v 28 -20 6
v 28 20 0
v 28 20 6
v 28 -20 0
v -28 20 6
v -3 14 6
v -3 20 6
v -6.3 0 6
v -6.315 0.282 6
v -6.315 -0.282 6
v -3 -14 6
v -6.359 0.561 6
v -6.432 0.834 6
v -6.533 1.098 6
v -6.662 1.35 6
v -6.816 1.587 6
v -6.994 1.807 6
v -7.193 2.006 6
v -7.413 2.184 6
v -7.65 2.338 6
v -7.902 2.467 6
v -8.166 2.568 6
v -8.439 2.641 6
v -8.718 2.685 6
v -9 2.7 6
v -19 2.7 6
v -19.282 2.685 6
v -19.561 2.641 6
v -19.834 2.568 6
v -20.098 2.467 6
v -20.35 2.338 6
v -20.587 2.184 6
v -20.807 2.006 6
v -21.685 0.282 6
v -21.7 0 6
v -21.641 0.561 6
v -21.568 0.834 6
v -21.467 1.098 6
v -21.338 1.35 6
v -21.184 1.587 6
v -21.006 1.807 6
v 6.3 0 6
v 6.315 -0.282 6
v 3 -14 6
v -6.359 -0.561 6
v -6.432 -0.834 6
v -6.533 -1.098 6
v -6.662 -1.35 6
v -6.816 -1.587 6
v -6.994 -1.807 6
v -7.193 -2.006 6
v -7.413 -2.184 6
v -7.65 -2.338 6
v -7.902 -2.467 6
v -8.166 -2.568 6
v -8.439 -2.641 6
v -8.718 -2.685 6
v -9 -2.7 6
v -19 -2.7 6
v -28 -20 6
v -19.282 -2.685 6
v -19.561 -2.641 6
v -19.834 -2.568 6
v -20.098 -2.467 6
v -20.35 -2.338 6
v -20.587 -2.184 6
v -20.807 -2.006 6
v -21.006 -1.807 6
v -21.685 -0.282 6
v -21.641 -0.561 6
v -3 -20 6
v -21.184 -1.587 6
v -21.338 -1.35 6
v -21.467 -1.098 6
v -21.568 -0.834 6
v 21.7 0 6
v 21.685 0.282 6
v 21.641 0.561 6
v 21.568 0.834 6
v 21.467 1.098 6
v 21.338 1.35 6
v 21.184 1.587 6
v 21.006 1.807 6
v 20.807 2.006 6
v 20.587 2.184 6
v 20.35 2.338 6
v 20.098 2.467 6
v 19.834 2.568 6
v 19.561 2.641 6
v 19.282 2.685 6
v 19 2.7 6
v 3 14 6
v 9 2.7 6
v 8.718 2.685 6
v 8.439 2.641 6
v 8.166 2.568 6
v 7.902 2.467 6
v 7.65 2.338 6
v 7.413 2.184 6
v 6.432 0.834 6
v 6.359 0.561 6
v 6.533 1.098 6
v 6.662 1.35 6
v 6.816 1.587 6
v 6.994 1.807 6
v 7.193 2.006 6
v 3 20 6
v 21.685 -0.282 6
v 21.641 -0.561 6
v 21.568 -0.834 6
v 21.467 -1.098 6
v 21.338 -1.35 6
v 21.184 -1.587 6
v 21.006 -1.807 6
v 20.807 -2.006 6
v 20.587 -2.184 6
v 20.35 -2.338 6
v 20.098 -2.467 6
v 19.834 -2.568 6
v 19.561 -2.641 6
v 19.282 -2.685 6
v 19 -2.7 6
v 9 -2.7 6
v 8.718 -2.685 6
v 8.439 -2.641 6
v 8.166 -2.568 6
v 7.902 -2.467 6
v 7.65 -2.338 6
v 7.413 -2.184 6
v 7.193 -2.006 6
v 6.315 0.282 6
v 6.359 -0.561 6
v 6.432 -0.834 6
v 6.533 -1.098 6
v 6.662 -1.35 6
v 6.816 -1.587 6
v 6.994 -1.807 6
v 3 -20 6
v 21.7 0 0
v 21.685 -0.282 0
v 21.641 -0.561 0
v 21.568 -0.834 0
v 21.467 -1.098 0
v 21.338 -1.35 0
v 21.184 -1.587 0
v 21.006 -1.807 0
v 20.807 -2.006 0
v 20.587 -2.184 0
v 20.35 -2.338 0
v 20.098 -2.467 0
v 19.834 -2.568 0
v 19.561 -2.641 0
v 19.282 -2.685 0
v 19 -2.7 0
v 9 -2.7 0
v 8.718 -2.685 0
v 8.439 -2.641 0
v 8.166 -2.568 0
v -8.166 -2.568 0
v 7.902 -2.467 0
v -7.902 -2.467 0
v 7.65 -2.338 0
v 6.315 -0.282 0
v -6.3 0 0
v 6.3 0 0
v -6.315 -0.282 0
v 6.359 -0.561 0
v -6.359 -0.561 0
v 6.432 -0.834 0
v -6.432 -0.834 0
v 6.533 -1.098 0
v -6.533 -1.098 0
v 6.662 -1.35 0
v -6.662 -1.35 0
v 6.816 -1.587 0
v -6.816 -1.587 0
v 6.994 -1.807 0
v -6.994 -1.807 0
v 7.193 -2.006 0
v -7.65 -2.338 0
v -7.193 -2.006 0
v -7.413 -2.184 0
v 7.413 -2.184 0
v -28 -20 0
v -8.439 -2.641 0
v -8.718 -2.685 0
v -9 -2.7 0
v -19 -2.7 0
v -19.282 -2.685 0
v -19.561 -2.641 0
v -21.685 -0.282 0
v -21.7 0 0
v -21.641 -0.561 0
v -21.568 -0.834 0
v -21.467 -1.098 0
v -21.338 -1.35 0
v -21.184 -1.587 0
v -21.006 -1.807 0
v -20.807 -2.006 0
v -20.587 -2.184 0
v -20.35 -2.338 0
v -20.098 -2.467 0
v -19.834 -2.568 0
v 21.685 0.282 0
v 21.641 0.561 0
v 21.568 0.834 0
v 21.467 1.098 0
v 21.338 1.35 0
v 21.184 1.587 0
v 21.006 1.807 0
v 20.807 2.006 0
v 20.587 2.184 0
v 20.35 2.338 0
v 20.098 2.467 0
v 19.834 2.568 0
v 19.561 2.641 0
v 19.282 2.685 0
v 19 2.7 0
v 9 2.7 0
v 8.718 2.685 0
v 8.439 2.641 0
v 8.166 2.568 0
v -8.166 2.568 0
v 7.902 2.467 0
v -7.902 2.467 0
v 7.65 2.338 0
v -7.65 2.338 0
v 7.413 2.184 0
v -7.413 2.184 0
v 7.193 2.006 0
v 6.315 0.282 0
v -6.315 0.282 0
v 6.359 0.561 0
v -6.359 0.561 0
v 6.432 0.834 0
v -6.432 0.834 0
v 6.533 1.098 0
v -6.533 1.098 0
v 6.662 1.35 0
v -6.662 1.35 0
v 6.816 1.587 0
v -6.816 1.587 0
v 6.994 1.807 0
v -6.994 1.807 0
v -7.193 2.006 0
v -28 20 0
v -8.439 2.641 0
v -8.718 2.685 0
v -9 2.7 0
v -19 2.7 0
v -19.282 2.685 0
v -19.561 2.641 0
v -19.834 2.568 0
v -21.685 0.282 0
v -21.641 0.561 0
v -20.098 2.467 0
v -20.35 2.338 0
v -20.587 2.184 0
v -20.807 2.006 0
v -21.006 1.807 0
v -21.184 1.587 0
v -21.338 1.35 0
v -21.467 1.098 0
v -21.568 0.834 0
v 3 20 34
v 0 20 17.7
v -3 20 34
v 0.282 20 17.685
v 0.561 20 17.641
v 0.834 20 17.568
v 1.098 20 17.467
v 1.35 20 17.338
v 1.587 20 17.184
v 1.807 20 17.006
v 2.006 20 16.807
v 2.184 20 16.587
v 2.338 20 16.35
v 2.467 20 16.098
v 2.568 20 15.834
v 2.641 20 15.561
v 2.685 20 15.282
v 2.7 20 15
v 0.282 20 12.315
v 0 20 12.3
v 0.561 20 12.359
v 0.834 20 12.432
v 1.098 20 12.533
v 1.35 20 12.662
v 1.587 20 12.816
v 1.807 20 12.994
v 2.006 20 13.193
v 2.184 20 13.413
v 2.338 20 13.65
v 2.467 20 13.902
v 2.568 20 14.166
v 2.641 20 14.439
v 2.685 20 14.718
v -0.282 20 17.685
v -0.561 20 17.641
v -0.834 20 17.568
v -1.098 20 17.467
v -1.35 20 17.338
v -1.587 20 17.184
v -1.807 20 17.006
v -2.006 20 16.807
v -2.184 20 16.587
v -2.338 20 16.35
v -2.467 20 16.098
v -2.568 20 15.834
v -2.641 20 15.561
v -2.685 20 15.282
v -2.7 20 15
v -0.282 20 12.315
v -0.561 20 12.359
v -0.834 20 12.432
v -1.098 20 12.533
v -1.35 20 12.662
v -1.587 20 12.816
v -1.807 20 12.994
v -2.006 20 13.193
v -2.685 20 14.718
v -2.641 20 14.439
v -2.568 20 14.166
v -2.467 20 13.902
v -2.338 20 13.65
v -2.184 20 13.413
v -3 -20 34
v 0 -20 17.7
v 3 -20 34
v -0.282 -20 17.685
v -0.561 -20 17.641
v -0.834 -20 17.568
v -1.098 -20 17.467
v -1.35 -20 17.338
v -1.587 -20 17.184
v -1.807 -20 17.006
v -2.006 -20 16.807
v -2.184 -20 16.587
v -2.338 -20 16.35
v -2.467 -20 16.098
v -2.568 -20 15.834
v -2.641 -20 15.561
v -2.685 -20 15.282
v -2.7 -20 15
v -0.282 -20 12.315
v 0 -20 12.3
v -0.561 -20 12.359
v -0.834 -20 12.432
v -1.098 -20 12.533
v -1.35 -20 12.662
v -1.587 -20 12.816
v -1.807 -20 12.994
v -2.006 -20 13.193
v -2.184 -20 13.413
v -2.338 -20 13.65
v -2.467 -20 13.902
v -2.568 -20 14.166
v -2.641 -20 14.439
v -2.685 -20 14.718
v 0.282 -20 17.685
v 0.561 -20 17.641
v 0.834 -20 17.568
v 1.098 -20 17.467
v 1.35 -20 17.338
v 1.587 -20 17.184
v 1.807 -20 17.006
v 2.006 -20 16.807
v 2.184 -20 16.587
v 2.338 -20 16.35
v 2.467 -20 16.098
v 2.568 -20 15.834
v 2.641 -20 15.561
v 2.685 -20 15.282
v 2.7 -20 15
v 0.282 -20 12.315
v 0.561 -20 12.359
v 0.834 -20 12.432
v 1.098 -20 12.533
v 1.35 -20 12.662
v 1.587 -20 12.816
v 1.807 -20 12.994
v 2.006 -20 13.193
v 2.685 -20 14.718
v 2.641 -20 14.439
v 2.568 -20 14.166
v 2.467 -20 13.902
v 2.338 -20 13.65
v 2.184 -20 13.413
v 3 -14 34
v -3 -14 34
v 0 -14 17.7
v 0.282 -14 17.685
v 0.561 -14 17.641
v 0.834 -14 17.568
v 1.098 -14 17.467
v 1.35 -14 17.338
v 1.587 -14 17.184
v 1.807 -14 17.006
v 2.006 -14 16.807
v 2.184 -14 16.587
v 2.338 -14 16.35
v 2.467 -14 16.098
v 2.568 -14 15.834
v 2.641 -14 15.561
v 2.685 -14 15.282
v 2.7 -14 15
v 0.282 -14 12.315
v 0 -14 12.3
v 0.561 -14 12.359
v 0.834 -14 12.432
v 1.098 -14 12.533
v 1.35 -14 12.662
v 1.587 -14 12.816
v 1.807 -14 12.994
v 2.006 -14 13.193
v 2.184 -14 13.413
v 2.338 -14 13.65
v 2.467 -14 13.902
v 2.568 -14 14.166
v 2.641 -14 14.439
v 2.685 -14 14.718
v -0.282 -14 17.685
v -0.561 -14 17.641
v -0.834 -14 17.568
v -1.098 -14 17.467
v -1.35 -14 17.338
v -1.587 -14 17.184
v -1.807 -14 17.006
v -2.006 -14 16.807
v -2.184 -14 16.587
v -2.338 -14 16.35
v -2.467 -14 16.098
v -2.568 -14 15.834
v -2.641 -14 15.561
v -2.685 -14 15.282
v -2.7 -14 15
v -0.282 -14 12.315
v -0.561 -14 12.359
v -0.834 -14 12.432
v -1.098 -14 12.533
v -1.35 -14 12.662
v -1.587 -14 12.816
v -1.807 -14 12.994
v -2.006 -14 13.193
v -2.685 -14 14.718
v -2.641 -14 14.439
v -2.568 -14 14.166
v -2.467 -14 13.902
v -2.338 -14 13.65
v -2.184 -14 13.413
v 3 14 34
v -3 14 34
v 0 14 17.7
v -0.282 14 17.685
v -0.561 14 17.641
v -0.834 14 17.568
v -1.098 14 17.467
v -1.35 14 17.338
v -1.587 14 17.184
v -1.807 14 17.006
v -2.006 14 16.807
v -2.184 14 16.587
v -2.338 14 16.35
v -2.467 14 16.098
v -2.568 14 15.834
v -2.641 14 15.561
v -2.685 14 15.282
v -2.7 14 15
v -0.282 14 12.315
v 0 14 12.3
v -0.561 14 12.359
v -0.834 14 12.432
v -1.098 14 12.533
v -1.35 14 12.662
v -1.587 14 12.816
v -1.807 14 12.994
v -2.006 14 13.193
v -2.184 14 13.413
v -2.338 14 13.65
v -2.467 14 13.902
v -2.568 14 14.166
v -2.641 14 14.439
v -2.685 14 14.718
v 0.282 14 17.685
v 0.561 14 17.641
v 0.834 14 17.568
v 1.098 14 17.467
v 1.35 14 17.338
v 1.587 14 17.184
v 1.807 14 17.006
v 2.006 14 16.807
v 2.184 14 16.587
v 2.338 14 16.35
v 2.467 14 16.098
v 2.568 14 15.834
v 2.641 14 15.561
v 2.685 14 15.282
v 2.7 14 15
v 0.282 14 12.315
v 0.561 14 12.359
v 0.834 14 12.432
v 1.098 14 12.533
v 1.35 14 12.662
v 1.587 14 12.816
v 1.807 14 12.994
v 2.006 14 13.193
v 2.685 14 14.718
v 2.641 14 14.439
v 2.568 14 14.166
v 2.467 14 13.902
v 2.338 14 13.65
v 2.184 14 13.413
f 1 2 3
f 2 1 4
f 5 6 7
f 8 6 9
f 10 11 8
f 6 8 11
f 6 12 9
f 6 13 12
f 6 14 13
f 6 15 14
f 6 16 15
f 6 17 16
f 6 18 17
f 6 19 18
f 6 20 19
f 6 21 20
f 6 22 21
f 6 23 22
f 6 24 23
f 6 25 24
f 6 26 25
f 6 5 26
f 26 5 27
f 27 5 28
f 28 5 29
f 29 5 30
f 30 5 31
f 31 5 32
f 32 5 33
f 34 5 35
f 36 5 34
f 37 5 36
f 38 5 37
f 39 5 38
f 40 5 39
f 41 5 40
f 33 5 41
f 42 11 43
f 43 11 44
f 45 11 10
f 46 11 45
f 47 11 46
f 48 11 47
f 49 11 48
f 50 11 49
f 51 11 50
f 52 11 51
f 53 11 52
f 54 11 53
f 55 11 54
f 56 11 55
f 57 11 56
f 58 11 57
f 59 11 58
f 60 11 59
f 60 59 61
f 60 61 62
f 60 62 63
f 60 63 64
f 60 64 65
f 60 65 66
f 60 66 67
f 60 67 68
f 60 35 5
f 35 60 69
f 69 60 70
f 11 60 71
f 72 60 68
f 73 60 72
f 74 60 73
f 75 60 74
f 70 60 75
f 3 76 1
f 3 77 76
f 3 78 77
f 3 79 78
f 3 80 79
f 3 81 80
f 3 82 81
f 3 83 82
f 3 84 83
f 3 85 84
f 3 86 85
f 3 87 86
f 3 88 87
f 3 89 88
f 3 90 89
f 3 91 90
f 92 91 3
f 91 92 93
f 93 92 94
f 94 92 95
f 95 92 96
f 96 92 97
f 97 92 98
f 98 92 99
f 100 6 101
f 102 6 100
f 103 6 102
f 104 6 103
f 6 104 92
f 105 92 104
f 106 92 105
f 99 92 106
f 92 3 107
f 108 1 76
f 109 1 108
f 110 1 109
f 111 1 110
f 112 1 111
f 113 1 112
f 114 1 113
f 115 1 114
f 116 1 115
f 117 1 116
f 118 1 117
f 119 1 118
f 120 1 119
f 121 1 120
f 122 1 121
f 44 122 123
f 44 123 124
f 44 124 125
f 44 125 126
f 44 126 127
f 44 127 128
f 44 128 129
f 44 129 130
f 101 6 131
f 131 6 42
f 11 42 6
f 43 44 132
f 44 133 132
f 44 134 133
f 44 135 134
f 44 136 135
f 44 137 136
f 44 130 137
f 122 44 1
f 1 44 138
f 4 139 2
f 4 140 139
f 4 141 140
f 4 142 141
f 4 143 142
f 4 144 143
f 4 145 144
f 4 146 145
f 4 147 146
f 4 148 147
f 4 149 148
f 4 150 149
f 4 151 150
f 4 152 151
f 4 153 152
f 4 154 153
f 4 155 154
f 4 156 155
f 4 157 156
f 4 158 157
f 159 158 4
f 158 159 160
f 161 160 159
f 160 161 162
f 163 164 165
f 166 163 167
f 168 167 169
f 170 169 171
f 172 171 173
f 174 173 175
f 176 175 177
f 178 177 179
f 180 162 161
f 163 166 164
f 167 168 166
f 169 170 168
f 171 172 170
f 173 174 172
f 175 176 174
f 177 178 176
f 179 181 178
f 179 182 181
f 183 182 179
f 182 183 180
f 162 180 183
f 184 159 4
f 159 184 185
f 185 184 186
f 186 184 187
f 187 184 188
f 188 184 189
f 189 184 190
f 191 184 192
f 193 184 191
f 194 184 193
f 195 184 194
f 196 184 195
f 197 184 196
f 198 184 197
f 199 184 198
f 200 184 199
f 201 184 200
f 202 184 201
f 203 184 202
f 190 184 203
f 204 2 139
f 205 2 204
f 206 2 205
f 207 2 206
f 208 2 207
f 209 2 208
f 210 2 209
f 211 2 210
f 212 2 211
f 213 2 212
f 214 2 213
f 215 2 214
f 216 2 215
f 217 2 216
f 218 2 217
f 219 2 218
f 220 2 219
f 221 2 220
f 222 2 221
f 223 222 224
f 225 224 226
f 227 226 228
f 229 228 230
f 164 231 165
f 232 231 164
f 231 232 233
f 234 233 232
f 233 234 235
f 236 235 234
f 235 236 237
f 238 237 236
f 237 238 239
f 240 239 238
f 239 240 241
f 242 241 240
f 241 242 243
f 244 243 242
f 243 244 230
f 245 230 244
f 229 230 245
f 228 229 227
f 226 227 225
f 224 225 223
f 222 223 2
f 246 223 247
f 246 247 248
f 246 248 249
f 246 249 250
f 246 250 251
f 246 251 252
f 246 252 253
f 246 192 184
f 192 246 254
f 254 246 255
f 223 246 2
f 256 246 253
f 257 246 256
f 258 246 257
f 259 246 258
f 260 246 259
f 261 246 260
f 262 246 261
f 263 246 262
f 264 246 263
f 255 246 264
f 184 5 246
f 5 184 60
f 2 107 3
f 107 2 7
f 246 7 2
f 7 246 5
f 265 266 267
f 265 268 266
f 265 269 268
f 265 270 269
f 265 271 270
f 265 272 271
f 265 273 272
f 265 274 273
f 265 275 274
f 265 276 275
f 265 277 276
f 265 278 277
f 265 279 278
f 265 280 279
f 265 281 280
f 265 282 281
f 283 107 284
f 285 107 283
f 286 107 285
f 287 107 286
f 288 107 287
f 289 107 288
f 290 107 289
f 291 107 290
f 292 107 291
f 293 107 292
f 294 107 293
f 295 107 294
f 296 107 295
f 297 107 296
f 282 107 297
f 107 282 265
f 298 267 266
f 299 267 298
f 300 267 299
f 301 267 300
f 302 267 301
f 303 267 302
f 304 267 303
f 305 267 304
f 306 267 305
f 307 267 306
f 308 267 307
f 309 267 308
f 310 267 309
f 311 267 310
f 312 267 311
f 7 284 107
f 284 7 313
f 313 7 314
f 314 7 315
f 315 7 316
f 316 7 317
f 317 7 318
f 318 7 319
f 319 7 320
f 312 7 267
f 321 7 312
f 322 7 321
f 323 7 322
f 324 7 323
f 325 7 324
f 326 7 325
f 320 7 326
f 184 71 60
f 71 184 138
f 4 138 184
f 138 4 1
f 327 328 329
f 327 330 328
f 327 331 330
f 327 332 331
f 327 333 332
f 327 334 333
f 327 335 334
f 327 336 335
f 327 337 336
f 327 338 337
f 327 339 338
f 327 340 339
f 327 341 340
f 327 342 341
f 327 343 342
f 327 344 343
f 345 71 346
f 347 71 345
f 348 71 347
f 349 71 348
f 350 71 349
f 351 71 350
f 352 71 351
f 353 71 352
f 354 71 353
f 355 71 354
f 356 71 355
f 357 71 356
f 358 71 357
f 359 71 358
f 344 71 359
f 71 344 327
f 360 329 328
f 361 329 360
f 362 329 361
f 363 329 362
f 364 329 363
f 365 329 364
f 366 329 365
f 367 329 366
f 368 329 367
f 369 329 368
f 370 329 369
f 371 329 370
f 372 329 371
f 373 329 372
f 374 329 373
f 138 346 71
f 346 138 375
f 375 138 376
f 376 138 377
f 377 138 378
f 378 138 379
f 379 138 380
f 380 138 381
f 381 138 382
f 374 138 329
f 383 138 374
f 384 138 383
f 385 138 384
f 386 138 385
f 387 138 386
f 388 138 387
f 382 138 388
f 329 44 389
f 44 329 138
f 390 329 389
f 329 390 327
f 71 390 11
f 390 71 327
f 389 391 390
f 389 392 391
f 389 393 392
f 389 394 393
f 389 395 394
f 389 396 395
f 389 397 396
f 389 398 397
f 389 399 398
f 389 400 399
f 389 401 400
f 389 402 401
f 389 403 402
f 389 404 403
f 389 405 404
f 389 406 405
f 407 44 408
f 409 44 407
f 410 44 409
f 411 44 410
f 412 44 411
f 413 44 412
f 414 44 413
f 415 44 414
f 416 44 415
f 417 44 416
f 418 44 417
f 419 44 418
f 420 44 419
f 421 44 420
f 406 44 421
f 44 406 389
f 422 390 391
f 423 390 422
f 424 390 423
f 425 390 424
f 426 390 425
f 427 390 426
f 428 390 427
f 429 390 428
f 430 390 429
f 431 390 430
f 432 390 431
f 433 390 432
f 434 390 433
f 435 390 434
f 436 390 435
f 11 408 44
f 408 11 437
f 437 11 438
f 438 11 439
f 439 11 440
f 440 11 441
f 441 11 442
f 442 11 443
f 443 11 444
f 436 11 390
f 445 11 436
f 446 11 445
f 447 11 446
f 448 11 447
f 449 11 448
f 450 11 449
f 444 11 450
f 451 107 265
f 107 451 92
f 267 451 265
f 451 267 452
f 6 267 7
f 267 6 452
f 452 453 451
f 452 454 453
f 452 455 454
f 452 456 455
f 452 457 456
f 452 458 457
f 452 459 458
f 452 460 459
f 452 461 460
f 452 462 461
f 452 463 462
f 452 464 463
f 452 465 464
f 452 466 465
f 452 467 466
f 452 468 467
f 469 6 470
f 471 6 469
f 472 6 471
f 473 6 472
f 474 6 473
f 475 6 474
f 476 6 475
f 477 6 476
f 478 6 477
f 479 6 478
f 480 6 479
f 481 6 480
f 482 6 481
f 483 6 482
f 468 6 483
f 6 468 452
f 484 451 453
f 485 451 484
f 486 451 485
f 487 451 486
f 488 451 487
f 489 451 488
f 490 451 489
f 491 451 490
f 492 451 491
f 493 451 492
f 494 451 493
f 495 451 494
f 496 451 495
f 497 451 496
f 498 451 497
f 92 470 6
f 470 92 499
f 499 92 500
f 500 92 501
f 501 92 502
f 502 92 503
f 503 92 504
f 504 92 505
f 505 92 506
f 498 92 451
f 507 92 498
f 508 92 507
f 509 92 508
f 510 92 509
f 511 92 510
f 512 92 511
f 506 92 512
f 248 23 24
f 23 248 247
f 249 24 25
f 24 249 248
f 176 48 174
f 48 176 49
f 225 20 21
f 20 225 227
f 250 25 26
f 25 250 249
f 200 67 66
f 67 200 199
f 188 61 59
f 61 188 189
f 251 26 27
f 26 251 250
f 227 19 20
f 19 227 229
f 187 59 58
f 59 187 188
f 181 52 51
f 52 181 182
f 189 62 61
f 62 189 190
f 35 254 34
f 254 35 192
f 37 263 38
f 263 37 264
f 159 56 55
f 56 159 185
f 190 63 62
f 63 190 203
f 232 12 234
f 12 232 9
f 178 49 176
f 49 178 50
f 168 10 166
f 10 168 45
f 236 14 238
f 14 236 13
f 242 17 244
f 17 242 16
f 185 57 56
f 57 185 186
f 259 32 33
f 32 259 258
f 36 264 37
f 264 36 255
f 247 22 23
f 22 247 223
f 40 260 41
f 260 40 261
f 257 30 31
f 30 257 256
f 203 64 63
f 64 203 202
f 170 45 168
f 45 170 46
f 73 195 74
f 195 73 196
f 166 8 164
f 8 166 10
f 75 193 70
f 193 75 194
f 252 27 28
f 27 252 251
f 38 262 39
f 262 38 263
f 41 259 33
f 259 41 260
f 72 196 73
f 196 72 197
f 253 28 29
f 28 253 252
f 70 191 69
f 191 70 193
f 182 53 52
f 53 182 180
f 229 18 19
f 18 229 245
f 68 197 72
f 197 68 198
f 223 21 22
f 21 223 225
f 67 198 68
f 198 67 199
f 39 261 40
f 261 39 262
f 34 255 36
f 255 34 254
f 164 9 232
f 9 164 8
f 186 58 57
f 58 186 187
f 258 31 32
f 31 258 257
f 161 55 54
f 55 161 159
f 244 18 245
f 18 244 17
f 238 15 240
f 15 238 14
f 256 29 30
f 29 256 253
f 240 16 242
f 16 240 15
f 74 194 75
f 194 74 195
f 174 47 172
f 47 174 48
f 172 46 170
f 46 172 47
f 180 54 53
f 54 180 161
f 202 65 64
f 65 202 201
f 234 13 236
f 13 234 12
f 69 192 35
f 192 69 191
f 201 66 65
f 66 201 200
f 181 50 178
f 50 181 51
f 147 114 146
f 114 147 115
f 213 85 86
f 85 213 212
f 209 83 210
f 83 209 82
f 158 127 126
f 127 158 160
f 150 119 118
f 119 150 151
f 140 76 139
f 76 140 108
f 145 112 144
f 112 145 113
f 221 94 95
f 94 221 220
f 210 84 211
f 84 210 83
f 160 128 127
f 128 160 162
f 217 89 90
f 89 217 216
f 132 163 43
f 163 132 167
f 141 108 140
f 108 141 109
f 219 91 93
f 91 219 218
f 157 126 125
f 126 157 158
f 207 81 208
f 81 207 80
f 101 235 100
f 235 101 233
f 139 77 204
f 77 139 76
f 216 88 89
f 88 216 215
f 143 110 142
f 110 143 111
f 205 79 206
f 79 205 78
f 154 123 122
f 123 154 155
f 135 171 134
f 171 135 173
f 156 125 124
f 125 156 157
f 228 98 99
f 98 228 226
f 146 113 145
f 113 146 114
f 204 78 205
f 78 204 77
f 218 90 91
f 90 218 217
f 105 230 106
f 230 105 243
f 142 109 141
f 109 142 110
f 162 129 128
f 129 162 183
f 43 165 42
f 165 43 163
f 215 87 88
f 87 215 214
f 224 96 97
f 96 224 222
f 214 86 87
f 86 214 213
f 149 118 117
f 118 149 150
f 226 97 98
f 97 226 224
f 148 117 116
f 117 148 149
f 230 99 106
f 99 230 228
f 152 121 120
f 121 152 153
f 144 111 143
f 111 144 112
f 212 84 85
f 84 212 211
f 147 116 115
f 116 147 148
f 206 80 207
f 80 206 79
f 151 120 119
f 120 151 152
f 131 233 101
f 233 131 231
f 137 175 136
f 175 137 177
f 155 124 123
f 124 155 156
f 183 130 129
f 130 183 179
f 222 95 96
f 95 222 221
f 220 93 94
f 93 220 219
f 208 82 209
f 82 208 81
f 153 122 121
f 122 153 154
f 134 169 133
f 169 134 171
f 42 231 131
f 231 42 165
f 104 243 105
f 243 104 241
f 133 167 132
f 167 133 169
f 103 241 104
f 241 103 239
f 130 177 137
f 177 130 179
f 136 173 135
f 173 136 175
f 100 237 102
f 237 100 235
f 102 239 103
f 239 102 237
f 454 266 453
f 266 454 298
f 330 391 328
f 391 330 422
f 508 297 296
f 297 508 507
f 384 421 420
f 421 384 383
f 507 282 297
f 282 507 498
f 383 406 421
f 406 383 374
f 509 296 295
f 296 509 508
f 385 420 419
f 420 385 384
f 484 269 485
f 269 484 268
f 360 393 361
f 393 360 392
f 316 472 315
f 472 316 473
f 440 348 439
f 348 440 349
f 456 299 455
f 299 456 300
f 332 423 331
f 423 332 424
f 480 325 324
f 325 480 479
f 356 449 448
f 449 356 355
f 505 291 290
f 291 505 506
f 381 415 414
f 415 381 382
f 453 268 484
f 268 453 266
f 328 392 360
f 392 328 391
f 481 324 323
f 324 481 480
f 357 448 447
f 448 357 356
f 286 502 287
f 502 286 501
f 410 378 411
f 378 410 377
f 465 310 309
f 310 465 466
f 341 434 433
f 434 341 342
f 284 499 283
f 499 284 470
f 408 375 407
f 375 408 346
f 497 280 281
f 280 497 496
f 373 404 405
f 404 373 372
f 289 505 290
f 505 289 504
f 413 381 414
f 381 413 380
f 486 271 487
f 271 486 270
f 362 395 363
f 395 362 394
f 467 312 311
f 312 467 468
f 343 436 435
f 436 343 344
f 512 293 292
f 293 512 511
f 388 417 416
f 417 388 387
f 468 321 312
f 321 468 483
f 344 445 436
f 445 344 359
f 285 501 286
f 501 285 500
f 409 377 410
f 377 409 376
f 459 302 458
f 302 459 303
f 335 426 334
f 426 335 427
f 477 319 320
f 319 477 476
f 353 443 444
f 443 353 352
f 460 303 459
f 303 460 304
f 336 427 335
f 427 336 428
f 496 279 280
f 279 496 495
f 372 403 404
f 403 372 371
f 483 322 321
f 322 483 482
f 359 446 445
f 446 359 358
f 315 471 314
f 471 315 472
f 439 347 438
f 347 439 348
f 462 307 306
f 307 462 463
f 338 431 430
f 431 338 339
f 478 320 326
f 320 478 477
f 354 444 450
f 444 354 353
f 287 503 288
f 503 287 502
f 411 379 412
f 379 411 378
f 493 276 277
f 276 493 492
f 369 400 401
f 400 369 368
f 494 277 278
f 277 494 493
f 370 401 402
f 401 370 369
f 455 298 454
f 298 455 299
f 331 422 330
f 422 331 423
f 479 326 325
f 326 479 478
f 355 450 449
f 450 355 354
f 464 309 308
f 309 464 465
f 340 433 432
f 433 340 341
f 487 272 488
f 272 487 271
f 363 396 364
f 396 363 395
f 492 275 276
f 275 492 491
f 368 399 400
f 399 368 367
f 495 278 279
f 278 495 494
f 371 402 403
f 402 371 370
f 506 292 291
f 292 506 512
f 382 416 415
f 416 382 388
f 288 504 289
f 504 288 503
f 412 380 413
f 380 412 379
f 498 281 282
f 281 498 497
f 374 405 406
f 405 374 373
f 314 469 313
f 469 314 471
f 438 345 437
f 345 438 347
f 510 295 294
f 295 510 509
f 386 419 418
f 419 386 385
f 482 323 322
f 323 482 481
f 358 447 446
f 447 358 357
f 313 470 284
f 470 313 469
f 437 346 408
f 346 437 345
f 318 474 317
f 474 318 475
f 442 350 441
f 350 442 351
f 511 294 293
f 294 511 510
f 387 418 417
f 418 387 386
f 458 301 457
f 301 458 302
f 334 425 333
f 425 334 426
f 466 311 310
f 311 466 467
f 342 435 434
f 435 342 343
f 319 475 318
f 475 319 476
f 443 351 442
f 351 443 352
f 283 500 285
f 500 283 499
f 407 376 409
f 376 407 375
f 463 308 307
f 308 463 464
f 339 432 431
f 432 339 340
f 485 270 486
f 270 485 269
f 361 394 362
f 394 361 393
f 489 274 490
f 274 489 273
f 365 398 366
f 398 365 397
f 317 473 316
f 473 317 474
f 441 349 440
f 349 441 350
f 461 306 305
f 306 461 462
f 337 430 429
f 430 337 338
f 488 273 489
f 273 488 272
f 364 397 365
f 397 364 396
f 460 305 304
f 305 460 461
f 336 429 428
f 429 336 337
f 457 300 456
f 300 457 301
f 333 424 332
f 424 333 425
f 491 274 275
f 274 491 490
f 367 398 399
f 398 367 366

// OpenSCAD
// U pivot bracket, 28 mm opening.
$fn = 60;
eps = 0.02;
base_l = 56;
base_w = 40;
base_t = 6;
ear_t = 6;
ear_h = 30;
pivot_d = 5.4;
module mount(x) {
    hull() {
        translate([x - 5, 0, -eps]) cylinder(d = 5.4, h = base_t + 2 * eps);
        translate([x + 5, 0, -eps]) cylinder(d = 5.4, h = base_t + 2 * eps);
    }
}
difference() {
    union() {
        translate([-base_l / 2, -base_w / 2, 0]) cube([base_l, base_w, base_t]);
        translate([-ear_t / 2, -base_w / 2, base_t - 2]) cube([ear_t, ear_t, ear_h]);
        translate([-ear_t / 2, base_w / 2 - ear_t, base_t - 2]) cube([ear_t, ear_t, ear_h]);
    }
    mount(-14); mount(14);
    translate([0, -base_w / 2 - eps, ear_h / 2]) rotate([-90, 0, 0]) cylinder(d = pivot_d, h = base_w + 2 * eps);
}
